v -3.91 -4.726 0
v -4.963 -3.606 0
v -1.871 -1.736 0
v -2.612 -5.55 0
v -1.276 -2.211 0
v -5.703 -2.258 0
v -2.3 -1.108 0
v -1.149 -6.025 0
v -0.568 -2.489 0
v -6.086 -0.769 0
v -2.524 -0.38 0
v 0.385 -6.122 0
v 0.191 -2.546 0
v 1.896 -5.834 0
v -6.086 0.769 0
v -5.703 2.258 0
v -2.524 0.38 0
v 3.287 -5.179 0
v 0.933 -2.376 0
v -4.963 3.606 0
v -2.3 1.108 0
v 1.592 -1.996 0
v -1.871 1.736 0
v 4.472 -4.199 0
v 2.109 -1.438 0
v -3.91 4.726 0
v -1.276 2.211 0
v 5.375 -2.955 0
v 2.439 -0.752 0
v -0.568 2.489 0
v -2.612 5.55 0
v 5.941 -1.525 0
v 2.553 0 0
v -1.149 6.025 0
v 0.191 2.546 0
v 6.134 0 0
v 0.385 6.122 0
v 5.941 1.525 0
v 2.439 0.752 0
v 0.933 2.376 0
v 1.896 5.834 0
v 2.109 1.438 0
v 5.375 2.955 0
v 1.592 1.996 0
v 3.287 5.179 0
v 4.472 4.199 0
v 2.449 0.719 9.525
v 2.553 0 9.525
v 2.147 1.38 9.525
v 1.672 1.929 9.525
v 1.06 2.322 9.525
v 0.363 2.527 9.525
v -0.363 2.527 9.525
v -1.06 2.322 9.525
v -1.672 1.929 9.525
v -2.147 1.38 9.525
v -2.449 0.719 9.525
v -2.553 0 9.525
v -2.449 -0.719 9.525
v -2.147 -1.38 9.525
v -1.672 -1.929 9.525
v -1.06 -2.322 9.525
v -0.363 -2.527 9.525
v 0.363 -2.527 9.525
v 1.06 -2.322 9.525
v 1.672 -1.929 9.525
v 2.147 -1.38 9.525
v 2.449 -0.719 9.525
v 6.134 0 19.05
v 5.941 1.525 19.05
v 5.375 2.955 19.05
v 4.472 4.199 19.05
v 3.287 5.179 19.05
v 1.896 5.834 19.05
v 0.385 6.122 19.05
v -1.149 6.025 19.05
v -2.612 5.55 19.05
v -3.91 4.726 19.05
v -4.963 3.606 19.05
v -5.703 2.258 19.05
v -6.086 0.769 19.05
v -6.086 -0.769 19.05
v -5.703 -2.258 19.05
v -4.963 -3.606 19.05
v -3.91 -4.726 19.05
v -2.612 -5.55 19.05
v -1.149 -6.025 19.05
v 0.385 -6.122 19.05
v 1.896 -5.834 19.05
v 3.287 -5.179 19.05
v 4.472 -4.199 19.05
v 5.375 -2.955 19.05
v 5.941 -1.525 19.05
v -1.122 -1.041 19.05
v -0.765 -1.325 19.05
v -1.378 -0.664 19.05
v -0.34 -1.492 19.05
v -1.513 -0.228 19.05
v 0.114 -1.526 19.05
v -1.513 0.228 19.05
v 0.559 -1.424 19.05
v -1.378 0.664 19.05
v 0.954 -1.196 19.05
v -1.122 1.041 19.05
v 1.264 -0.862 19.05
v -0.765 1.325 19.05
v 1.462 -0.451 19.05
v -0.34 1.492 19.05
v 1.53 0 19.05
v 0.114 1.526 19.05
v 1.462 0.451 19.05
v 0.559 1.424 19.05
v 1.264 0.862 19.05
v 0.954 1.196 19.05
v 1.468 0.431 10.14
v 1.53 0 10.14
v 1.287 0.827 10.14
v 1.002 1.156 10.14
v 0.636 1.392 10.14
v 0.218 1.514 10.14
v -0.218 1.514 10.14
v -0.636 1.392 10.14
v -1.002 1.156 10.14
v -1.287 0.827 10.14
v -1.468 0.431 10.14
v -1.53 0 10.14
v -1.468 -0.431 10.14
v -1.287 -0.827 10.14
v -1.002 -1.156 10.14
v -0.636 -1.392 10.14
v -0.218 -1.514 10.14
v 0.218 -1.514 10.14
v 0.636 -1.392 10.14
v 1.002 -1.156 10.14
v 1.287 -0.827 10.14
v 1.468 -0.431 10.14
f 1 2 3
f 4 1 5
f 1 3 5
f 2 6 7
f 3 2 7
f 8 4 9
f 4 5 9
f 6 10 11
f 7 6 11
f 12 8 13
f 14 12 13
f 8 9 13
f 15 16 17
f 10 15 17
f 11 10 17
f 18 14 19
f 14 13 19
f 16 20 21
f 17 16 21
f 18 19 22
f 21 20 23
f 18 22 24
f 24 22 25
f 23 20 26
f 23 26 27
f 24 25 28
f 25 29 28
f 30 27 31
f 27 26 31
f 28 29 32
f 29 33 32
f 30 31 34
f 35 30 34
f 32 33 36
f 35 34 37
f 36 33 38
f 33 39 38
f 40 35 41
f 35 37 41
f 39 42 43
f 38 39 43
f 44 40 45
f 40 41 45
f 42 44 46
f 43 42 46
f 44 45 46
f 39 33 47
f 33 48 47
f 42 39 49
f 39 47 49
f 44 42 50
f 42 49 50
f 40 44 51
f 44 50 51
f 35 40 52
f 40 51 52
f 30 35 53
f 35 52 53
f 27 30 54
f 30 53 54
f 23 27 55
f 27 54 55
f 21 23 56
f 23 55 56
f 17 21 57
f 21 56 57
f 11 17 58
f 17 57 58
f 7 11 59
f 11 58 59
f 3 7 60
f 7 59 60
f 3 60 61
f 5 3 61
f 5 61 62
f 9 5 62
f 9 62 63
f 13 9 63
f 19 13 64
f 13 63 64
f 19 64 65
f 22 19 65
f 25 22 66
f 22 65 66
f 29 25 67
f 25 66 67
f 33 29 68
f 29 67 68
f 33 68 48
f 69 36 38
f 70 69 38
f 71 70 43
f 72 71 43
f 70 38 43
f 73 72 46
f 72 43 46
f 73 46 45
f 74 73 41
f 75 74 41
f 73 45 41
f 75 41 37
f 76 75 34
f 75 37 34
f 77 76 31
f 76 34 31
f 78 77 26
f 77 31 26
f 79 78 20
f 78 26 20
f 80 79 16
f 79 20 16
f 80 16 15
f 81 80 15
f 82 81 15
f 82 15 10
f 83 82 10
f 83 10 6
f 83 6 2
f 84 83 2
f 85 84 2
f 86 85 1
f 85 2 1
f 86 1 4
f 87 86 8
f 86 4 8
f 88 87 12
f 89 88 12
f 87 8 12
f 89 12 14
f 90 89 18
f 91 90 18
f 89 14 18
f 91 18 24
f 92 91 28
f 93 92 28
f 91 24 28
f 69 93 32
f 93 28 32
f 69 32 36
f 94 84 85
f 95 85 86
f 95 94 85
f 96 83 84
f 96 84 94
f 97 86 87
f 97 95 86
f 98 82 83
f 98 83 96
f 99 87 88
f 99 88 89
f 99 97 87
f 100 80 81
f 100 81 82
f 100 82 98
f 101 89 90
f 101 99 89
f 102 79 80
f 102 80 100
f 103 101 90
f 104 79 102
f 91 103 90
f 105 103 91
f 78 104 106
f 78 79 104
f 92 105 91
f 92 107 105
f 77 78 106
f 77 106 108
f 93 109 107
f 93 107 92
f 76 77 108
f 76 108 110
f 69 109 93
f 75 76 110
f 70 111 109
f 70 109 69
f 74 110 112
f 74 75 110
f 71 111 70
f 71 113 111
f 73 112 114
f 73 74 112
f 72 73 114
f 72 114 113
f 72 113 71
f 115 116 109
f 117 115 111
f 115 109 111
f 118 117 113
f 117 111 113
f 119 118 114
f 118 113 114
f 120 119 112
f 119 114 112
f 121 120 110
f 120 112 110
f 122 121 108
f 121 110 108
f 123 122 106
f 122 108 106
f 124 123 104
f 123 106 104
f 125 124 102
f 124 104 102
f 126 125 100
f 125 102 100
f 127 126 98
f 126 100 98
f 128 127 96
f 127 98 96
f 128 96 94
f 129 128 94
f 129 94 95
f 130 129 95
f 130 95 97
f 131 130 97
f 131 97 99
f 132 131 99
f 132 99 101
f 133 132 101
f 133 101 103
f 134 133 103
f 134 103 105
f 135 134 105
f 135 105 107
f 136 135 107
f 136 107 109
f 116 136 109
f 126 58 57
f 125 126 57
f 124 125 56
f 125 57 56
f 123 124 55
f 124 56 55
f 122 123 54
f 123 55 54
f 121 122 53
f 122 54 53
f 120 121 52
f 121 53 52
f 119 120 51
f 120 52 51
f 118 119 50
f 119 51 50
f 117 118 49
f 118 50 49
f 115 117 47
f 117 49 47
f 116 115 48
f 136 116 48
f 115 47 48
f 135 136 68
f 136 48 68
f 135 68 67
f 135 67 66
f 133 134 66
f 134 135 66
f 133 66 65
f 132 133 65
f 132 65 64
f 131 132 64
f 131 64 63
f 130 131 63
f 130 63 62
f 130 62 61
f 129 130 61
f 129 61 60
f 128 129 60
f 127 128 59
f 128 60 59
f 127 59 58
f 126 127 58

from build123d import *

# Parameters (mm, degrees)
SKETCH1_R                   = 6.1341
BOSS_EXTRUDE1_DEPTH         = 19.05
SKETCH2_R                   = 1.53
CUT_EXTRUDE1_DEPTH          = 20.05
F_1_4_20_TAPPED_HOLE1_D     = 5.1054
F_1_4_20_TAPPED_HOLE1_DEPTH = 9.525
F_1_4_20_TAPPED_HOLE1_TIP   = 1.533816902


with BuildPart() as part:
    # Sketch1 → Boss-Extrude1 (new body)
    with BuildSketch(Plane.XY):
        Circle(SKETCH1_R)
    extrude(amount=BOSS_EXTRUDE1_DEPTH)

    # Sketch2 → Cut-Extrude1 (cut, through all)
    with BuildSketch(Plane.XY.offset(19.05)):
        Circle(SKETCH2_R)
    extrude(amount=-CUT_EXTRUDE1_DEPTH, mode=Mode.SUBTRACT)

    # 1/4-20 Tapped Hole1
    with Locations(Plane(origin=(0, 0, 0), x_dir=(-1, 0, 0), z_dir=(0, 0, -1))):
        with Locations((0, 0)):
            Hole(F_1_4_20_TAPPED_HOLE1_D / 2, depth=F_1_4_20_TAPPED_HOLE1_DEPTH)
            with Locations((0, 0, -(F_1_4_20_TAPPED_HOLE1_DEPTH + F_1_4_20_TAPPED_HOLE1_TIP / 2))):  # 118° drill point
                Cone(0, F_1_4_20_TAPPED_HOLE1_D / 2, F_1_4_20_TAPPED_HOLE1_TIP, mode=Mode.SUBTRACT)


solid = part.part
